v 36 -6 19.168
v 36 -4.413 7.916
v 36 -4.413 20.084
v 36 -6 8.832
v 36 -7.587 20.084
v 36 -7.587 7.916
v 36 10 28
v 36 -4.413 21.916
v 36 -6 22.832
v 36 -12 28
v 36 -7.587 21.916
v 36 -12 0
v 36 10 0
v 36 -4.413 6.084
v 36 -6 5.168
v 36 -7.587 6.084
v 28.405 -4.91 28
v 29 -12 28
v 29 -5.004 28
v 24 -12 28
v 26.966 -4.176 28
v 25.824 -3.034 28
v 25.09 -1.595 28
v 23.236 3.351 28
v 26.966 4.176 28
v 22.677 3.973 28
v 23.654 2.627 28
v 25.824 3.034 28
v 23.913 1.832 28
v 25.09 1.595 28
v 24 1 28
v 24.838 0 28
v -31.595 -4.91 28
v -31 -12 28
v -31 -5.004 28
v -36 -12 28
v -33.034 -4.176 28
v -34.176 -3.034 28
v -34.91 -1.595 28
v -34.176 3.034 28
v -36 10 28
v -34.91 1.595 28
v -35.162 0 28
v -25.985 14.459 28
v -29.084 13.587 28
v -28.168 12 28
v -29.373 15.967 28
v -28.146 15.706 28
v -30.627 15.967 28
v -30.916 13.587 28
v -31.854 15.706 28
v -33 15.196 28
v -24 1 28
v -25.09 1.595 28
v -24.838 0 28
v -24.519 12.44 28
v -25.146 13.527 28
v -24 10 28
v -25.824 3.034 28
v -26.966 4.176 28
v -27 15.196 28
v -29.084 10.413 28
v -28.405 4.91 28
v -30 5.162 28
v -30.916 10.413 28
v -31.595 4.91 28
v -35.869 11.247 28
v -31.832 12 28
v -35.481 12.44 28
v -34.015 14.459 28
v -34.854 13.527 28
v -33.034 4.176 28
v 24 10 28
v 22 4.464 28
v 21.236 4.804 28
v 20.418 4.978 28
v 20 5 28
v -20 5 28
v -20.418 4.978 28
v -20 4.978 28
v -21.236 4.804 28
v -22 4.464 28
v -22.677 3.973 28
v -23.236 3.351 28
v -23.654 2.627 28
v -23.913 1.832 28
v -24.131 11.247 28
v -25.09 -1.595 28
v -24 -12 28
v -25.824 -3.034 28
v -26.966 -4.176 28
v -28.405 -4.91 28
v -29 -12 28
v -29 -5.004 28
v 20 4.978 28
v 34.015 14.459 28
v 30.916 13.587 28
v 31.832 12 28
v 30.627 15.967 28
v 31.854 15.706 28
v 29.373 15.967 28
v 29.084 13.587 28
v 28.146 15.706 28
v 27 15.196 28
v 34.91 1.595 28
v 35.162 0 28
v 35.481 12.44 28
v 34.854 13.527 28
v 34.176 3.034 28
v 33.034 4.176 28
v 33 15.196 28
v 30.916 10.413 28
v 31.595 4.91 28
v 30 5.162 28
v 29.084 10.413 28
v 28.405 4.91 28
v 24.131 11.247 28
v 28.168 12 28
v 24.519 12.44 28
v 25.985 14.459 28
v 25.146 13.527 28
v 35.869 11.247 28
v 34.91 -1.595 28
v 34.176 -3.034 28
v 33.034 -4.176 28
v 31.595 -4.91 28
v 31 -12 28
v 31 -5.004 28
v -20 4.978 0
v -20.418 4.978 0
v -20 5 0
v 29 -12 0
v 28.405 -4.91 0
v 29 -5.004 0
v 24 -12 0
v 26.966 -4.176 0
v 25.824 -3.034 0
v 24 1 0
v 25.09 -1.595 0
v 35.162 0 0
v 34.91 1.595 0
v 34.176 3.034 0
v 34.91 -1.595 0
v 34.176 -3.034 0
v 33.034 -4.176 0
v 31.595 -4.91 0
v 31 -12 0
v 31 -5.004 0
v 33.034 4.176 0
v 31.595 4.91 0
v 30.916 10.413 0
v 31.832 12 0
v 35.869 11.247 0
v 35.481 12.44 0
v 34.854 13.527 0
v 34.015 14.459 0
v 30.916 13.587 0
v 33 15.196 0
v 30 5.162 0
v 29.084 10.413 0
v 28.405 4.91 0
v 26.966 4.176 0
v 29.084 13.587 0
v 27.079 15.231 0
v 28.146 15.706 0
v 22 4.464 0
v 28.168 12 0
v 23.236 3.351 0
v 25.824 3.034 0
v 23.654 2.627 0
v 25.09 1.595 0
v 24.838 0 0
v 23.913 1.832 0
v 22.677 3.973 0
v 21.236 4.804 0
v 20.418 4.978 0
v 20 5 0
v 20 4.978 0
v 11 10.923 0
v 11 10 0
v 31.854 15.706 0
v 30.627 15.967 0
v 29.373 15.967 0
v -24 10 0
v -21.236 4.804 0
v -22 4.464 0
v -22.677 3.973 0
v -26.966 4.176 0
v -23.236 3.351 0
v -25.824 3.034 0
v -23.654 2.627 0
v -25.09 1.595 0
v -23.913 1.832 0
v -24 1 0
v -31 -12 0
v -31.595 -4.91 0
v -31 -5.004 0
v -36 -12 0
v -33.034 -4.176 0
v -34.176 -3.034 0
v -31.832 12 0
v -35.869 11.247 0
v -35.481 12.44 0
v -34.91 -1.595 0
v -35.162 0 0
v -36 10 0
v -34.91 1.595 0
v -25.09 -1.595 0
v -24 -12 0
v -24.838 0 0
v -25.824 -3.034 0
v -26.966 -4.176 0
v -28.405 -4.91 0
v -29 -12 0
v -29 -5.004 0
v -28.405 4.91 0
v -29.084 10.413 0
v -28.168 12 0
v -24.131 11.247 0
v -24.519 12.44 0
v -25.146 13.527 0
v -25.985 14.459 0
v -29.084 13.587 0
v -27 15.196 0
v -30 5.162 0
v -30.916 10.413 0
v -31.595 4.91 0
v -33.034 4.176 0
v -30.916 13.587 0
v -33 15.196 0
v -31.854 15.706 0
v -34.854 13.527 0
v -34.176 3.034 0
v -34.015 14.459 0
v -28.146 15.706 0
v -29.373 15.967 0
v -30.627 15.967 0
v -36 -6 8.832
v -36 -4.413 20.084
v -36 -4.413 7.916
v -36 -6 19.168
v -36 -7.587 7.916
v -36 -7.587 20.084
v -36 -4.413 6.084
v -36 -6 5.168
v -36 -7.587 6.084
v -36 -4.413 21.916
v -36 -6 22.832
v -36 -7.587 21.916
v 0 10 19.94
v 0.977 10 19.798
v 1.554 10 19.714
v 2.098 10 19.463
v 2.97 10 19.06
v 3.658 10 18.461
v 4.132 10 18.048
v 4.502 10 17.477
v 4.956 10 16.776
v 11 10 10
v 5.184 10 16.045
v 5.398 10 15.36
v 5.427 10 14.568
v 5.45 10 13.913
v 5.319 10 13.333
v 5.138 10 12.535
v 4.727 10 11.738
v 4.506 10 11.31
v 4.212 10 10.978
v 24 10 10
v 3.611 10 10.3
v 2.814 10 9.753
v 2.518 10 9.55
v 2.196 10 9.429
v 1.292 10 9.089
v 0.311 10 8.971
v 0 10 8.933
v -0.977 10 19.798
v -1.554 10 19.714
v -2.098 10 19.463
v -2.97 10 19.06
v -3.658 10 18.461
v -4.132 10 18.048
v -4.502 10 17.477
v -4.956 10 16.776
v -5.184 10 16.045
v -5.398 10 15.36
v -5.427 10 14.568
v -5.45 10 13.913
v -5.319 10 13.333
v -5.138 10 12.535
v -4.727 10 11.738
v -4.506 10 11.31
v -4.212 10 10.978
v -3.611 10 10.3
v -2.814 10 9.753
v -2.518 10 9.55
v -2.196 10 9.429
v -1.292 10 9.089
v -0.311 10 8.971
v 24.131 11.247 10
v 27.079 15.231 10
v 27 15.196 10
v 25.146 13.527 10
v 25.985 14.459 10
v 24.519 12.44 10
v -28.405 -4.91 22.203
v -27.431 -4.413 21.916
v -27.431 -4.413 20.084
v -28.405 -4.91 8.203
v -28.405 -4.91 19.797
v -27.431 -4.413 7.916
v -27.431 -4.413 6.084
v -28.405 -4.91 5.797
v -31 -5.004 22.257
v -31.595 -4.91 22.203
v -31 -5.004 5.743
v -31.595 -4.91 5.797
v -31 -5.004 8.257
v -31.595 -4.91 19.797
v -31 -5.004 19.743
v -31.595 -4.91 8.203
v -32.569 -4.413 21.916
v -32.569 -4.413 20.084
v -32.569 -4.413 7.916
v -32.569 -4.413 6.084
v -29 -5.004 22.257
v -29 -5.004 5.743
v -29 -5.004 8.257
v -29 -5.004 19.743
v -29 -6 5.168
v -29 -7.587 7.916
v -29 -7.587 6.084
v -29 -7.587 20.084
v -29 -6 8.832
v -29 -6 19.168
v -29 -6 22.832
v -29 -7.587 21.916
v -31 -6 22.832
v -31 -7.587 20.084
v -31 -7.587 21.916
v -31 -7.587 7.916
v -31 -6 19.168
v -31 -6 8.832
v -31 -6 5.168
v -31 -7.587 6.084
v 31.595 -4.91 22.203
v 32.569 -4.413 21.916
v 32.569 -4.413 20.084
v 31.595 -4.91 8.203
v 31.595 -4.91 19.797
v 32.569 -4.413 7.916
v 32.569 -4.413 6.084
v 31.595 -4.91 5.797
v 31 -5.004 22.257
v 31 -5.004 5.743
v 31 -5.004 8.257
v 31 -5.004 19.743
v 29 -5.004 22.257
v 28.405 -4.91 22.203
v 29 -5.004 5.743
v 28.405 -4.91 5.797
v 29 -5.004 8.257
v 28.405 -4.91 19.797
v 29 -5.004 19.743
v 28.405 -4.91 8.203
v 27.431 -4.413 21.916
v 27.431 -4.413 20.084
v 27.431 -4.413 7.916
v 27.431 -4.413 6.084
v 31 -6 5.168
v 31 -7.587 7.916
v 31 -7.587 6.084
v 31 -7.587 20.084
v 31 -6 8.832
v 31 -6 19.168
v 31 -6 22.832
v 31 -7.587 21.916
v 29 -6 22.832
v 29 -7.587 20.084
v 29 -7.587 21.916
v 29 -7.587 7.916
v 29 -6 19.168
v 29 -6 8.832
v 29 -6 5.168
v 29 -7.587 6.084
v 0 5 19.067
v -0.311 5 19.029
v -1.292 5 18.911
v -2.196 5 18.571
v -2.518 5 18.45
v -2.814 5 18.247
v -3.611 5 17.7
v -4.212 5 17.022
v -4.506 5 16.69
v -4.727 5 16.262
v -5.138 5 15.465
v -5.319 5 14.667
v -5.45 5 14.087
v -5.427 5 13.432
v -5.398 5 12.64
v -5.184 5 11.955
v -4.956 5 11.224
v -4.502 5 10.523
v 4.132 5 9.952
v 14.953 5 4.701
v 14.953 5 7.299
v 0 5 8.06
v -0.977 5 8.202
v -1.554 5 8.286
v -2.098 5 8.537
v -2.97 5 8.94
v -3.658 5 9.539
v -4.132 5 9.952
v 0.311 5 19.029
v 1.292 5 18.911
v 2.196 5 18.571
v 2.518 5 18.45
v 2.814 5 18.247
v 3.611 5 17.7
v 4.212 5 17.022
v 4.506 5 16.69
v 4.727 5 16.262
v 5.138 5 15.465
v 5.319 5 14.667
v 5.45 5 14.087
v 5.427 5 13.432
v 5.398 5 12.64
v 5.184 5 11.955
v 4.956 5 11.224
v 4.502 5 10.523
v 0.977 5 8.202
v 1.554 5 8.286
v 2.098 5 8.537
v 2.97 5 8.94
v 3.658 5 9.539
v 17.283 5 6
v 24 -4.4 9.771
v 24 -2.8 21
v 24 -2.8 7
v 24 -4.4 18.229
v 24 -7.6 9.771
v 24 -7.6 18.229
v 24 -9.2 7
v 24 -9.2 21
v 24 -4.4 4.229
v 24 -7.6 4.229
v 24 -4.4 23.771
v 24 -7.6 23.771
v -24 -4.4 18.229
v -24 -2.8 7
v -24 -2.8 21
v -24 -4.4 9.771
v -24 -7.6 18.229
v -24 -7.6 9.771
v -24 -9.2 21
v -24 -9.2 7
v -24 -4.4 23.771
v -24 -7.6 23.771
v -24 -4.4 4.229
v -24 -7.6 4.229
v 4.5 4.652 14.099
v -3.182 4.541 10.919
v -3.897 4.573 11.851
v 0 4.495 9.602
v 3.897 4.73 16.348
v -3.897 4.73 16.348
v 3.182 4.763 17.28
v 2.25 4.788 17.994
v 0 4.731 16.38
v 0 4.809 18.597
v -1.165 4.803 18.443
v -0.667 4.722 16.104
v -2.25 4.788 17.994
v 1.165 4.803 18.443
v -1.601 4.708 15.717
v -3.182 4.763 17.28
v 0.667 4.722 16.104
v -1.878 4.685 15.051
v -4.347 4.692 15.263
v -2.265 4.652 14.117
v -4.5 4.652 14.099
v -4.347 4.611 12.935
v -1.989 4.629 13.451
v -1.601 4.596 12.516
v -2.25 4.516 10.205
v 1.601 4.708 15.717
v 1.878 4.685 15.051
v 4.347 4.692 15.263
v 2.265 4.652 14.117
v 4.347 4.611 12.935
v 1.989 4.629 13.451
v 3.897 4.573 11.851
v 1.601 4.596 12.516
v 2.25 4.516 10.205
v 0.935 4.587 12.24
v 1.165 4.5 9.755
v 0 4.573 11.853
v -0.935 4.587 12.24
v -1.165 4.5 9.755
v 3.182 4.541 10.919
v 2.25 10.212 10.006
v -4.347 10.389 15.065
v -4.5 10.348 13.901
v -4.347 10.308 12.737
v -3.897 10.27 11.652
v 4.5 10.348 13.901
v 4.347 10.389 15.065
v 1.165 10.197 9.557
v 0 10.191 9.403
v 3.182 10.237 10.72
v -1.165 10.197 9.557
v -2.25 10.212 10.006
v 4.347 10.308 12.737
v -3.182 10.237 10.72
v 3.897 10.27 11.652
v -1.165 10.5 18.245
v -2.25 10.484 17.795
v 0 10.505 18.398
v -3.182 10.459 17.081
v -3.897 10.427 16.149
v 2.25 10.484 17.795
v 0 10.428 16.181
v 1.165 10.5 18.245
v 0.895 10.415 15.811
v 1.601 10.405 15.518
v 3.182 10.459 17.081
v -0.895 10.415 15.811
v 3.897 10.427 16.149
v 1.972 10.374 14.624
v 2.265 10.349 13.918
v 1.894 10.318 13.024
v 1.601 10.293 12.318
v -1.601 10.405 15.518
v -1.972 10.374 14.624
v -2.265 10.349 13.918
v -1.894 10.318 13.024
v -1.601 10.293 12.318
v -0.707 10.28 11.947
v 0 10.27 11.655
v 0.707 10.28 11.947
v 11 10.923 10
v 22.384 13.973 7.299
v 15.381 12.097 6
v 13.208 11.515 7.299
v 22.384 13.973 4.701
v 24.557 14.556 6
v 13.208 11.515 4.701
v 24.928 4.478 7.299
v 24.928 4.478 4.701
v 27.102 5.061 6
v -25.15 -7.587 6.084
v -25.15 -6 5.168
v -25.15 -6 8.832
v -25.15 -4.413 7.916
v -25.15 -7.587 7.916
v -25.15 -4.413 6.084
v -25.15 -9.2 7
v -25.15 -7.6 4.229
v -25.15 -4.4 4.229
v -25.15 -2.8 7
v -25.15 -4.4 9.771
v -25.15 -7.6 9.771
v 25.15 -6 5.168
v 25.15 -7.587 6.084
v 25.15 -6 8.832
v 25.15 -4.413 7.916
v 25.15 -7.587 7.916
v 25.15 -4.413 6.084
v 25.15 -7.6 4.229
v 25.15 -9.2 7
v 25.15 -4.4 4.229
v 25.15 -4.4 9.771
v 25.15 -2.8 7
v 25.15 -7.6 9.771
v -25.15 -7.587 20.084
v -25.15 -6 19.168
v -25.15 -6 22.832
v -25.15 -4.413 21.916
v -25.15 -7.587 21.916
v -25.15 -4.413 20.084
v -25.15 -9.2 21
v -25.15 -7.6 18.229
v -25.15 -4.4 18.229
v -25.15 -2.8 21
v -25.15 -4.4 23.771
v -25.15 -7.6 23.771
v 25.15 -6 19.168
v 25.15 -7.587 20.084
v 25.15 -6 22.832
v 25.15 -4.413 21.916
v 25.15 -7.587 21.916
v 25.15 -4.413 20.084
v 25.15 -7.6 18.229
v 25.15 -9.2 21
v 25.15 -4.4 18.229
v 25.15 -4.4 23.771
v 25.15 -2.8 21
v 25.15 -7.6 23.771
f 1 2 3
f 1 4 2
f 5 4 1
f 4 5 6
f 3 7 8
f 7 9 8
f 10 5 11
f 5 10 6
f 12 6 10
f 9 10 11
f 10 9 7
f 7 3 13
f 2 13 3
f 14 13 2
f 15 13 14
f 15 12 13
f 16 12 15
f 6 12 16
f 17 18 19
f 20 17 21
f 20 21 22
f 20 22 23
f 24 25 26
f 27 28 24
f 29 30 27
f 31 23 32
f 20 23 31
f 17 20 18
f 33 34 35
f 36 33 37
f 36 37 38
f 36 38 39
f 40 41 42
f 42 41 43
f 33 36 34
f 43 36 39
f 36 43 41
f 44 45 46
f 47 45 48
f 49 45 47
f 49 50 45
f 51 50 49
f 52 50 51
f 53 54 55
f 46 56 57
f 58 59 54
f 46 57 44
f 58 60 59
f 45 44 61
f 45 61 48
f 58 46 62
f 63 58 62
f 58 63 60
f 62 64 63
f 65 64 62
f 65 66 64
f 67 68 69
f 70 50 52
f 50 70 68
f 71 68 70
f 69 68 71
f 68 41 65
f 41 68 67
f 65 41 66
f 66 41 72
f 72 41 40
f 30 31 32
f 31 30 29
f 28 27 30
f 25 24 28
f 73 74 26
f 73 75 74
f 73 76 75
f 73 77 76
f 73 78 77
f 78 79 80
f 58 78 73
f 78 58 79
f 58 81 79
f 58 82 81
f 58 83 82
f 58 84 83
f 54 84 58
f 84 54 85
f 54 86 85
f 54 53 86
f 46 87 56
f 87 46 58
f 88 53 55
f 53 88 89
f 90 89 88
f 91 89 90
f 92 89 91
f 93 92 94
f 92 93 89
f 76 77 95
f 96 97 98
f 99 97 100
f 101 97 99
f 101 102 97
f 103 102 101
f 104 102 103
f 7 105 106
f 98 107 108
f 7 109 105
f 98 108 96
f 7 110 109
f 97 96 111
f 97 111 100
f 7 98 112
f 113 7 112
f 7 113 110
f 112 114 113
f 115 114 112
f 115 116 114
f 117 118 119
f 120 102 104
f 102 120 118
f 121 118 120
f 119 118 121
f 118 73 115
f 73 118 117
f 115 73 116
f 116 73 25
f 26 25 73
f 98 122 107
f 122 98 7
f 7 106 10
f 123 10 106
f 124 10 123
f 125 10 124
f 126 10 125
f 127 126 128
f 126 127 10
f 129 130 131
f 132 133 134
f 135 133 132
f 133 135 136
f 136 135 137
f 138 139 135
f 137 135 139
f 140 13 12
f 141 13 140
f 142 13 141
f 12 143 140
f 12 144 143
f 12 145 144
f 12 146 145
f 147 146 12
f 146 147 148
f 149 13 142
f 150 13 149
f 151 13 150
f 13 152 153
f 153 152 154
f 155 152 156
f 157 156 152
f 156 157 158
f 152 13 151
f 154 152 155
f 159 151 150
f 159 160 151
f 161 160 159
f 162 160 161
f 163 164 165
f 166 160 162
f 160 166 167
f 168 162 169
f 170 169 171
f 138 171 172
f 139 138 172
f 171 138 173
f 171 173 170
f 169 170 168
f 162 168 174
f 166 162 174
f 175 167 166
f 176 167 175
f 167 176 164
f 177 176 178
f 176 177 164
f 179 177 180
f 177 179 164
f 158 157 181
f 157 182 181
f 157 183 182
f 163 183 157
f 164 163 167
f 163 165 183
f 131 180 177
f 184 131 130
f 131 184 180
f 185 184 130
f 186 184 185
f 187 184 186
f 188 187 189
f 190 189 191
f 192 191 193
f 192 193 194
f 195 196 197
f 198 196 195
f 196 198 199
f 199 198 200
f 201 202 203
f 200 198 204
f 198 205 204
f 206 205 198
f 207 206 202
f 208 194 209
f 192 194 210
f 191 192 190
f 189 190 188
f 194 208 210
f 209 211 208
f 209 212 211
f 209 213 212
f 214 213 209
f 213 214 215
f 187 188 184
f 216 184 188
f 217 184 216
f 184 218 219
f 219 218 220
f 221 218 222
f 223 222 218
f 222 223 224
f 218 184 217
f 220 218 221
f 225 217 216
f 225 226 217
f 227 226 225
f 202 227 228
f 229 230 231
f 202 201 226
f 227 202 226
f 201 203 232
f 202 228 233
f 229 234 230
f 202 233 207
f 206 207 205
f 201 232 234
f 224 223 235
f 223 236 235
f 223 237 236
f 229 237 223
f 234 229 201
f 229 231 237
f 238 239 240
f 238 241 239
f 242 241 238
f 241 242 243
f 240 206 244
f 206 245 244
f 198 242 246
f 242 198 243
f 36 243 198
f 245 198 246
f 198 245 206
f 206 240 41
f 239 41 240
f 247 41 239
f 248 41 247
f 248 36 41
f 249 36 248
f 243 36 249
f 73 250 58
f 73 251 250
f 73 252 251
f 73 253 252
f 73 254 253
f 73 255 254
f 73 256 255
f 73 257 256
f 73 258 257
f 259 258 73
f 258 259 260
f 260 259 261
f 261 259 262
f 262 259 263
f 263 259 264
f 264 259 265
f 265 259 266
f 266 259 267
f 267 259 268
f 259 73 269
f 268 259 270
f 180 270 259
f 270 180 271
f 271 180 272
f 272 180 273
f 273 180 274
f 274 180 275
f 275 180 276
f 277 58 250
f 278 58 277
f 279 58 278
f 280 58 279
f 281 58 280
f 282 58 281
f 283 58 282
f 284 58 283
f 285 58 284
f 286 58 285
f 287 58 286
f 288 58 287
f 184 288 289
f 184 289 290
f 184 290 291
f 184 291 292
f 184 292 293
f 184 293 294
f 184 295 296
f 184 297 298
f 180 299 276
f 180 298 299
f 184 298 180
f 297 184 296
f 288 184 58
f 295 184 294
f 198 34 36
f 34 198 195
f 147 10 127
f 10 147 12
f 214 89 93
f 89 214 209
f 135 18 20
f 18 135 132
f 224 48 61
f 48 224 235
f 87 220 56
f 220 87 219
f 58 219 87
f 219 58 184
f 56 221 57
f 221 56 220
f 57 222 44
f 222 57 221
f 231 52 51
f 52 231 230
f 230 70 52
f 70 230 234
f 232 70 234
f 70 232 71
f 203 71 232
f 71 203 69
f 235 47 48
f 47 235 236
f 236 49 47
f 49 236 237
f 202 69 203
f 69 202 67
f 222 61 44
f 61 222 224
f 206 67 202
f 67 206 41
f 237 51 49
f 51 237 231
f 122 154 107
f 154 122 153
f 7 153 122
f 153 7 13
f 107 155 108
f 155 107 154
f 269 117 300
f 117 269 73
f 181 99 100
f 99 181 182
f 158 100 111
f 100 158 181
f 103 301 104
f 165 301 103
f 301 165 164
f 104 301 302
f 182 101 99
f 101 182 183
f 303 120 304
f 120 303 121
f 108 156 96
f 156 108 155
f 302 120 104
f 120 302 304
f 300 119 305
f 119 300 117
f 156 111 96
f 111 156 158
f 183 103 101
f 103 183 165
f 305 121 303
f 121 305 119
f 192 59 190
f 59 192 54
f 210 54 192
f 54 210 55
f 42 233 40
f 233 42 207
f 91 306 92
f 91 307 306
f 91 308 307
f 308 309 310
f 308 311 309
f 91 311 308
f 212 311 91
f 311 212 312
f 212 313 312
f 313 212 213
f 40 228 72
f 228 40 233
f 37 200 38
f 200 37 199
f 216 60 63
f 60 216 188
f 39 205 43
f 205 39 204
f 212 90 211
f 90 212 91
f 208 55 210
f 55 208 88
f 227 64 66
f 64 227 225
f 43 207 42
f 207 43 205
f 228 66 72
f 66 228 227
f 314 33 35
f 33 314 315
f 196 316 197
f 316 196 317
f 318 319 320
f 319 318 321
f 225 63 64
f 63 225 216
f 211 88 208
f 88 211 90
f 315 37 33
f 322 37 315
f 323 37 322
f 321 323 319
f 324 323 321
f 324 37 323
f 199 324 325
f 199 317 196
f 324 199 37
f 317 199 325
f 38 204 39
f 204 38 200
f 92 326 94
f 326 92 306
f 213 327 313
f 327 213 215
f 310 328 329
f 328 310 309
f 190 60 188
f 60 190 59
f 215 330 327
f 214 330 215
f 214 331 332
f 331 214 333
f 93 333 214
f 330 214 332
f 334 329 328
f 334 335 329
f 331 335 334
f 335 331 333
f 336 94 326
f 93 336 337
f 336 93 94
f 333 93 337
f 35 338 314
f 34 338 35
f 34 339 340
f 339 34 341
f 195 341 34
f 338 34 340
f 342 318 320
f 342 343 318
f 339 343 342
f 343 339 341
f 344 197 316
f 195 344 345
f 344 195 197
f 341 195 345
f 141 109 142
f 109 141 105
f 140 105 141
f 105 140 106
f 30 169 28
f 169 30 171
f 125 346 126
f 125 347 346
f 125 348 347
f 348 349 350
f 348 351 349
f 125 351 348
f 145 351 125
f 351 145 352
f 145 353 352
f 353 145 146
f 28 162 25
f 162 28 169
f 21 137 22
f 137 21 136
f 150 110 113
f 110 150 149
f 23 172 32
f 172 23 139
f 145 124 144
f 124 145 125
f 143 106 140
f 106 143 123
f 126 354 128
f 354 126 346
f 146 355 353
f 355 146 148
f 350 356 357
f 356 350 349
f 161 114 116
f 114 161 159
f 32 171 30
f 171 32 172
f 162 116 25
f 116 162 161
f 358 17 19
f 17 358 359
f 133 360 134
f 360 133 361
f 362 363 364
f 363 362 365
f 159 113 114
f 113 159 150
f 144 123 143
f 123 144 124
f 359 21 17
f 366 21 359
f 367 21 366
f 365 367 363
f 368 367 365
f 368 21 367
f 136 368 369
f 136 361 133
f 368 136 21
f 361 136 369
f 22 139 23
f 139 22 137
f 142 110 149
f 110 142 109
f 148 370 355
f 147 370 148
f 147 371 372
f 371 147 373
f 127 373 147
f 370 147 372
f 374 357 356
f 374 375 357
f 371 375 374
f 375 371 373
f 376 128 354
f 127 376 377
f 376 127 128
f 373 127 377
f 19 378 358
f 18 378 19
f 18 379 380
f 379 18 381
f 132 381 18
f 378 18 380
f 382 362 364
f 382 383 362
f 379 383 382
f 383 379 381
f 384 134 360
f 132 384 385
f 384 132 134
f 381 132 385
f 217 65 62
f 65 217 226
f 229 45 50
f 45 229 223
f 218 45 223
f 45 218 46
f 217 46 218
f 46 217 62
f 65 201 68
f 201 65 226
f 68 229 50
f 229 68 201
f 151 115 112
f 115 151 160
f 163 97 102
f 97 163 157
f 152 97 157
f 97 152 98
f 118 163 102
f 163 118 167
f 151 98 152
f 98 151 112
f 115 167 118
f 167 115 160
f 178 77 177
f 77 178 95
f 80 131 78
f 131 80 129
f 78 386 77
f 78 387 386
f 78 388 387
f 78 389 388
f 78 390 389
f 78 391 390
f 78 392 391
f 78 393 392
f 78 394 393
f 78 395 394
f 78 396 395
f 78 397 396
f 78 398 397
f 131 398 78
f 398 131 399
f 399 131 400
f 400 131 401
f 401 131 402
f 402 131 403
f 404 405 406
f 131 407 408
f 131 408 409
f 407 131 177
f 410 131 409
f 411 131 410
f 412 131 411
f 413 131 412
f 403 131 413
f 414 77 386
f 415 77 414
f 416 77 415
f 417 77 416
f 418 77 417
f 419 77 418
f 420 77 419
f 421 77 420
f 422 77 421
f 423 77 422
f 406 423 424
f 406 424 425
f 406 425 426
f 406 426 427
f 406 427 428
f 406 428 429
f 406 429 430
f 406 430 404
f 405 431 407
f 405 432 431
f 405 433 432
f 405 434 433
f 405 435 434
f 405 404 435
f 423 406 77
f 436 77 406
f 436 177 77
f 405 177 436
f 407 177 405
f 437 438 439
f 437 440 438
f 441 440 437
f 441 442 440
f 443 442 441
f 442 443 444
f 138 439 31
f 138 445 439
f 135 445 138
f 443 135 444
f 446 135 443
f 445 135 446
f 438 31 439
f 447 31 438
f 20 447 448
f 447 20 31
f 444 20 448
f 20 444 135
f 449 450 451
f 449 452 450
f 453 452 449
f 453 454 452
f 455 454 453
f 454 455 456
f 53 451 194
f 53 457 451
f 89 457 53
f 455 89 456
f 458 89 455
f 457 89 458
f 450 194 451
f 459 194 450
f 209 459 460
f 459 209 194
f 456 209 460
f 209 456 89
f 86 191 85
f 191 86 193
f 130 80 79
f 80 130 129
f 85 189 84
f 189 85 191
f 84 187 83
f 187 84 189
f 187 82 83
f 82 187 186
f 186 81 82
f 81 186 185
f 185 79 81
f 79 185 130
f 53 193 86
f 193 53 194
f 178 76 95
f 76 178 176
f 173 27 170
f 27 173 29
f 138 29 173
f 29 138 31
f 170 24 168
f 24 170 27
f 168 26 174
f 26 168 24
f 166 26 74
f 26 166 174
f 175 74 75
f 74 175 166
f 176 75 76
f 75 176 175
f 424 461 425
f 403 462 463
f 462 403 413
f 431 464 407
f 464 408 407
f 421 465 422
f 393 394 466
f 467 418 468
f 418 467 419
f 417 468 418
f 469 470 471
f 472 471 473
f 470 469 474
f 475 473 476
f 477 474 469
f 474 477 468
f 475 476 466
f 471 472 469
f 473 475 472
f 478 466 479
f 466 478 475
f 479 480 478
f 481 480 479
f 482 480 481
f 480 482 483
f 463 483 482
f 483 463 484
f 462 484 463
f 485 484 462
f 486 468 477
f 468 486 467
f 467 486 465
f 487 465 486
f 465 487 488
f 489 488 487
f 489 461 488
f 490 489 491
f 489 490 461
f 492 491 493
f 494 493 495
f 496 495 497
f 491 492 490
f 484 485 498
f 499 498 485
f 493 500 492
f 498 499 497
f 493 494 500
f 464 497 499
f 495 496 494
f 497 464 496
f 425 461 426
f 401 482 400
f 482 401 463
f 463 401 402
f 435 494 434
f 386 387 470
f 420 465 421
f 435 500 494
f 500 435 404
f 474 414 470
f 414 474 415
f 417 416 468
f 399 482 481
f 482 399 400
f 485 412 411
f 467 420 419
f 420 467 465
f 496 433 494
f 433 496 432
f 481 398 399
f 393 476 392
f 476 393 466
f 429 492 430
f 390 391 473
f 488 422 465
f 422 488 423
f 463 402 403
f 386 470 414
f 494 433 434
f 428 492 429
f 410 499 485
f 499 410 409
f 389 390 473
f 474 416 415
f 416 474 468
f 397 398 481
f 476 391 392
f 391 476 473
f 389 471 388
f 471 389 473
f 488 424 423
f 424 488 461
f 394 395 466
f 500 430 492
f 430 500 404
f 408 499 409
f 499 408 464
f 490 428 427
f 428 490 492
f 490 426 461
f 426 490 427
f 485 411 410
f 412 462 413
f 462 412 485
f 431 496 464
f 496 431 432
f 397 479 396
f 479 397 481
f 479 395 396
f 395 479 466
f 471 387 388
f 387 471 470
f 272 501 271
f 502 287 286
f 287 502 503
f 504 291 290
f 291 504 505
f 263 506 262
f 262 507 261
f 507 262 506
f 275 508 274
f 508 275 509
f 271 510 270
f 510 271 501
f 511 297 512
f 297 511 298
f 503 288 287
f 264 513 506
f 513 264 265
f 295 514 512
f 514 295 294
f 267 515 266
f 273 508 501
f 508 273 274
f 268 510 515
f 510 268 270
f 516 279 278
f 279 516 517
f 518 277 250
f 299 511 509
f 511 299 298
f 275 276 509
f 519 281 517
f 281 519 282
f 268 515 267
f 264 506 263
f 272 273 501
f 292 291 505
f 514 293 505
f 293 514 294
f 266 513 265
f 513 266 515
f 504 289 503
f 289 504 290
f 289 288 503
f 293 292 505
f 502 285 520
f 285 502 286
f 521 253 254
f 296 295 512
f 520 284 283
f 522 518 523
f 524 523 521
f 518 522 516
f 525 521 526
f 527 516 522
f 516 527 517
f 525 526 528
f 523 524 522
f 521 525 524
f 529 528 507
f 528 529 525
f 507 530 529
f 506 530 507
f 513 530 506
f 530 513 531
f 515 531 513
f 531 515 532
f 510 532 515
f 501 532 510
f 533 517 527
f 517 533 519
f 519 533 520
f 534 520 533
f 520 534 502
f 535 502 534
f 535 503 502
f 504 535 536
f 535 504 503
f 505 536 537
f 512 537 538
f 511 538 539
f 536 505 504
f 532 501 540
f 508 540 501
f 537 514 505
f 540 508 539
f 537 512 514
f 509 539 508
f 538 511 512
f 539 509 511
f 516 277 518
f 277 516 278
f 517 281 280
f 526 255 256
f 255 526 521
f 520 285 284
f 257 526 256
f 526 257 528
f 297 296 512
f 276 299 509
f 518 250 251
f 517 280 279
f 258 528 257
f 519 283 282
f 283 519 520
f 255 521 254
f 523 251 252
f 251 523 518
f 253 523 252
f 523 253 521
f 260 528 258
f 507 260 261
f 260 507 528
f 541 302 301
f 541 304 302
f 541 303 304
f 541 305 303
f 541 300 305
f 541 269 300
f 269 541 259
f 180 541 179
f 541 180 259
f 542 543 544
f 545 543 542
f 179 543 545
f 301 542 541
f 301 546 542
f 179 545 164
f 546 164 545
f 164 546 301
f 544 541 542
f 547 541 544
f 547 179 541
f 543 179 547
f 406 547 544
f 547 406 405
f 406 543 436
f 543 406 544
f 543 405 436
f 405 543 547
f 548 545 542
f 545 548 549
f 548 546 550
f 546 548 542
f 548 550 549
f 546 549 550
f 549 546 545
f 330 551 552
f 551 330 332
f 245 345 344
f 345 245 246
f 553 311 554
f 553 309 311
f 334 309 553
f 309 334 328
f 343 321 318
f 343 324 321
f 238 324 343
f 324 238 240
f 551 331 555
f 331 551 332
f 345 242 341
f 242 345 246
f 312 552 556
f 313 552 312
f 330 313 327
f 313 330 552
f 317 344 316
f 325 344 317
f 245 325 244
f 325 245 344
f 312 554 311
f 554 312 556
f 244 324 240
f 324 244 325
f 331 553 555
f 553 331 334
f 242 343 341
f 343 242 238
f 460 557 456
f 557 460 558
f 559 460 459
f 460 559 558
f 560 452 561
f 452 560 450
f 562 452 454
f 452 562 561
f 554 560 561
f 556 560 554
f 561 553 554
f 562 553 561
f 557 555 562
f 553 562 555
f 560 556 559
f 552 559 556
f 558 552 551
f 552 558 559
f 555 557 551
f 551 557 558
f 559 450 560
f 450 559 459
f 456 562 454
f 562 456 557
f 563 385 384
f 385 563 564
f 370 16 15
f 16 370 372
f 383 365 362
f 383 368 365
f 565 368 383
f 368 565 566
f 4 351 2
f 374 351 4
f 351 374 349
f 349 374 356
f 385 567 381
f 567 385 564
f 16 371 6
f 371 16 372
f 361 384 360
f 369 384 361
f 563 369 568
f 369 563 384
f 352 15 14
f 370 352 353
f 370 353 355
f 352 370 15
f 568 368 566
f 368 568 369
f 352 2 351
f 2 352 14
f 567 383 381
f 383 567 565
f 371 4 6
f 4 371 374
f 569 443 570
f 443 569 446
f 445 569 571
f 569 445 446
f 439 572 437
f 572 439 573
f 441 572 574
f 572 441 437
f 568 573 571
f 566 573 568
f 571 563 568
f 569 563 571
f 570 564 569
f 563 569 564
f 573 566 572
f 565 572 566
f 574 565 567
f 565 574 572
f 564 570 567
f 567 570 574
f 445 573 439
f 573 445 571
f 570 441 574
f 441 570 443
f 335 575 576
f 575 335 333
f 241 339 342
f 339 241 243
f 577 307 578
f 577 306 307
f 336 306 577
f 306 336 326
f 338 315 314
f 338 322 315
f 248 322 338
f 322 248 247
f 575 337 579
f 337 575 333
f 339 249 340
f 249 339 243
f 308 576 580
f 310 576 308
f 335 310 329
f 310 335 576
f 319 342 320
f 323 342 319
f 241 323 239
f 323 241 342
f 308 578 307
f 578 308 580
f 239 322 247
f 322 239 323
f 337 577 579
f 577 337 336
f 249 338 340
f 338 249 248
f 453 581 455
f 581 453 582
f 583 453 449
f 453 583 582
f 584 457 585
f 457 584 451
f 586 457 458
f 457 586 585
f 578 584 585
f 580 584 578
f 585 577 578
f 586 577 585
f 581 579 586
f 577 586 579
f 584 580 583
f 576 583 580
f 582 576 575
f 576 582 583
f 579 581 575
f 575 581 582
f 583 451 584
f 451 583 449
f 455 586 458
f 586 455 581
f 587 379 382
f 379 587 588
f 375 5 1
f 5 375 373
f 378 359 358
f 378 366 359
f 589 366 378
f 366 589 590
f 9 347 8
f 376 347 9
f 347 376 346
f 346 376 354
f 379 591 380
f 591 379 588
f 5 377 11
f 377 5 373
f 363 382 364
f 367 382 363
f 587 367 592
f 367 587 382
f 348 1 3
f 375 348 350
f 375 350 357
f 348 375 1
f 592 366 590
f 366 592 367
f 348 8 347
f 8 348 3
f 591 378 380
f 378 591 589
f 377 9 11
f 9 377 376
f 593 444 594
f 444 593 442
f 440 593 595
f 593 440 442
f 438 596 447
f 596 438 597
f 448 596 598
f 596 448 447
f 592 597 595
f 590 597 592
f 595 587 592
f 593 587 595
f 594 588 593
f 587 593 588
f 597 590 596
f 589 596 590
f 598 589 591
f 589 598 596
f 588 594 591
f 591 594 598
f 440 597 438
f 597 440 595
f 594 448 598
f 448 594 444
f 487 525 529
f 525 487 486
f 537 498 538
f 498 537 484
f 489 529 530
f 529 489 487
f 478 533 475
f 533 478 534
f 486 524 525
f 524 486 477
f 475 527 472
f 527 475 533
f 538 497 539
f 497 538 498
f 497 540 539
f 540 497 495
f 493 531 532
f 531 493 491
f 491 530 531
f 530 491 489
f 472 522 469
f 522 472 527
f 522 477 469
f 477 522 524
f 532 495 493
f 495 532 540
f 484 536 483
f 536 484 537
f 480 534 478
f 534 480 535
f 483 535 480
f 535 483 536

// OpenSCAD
// file: polyholes.scad
//
// Mendel90
//
// GNU GPL v2
// nop.head@gmail.com
// hydraraptor.blogspot.com
//
// See http://hydraraptor.blogspot.com/2011/02/polyholes.html
//
function sides(r) = max(round(4 *r),3);
function corrected_radius(r,n) = 0.1 + r / cos(180 / n);
function corrected_diameter(d) = 0.2 + d / cos(180 / sides(d / 2));

module poly_circle(r, center = false) {
    n = sides(r);
    circle(r = corrected_radius(r,n), $fn = n, center = center);
}

module poly_cylinder(r, h, center = false) {
    n = sides(r);
    cylinder(h = h, r = corrected_radius(r,n), $fn = n, center = center);
}

module poly_d_cylinder(r, center = false) {
    n = sides(r);
    r = corrected_radius(r,n);
    cylinder(h = h, r = r, $fn = n, center = center);
    translate([0, -r, 0])
        cube([r, 2 * r, h]);
}
// file: bracket.scad
include <configuration.scad>

$fa = 12;
$fs = 0.5;
use <polyholes.scad>

w = 60; // Smooth rod distance (center to center)

module screws() {
  for (x = [-smooth_rod_separation/2, smooth_rod_separation/2]) {
    translate([x, 0, 0]) {
      // Push-through M3 screw hole.
      translate([0, -6, 0]) rotate([0, 90, 0])
	poly_cylinder(r=1.5, h=20, center=true);
      // M3 nut holder.
      translate([-x/5, -6, 0])
	rotate([30, 0, 0]) rotate([0, 90, 0])
	cylinder(r=3.2, h=2.3, center=true, $fn=6);
    }
  }
}

module bracket(h) {
  difference() {
    union() {
      translate([0, -1, 0]) cube([smooth_rod_separation+12, 22, h], center=true);
      // Sandwich mount.
      translate([-smooth_rod_separation/2, 10, 0]) cylinder(r=6, h=h, center=true);
      translate([smooth_rod_separation/2, 10, 0]) cylinder(r=6, h=h, center=true);
    }
    // Sandwich mount.
    translate([-smooth_rod_separation/2, 12, 0]) poly_cylinder(r=1.5, h=h+1, center=true);
    translate([smooth_rod_separation/2, 12, 0]) poly_cylinder(r=1.5, h=h+1, center=true);
    // Smooth rod mounting slots.
    for (x = [-smooth_rod_separation/2, smooth_rod_separation/2]) {
      translate([x, 0, 0]) {
	poly_cylinder(r=smooth_rod_radius, h=h+1, center=true);
	translate([0, -10, 0]) cube([2, 20, h+1], center=true);
      }
    }
    // Belt path.
    translate([0, -5, 0]) cube([smooth_rod_separation-20, 20, h+1], center=true);
    translate([0, -9, 0]) cube([smooth_rod_separation-12, 20, h+1], center=true);
    translate([-smooth_rod_separation/2+10, 1, 0]) cylinder(r=4, h=h+1, center=true);
    translate([smooth_rod_separation/2-10, 1, 0]) cylinder(r=4, h=h+1, center=true);
  }
}

translate([0, 0, 10]) bracket(20);
// file: configuration.scad
// Bearing dimensions: ID, OD, W
bearing623 = [3, 10, 4];
bearing624 = [4, 13, 5];
bearing608 = [8, 22, 7];
bearinglm8uu = [8, 15, 25];
bearinglm10uu = [10, 19, 29];

smooth_rod_separation = 60;
//smooth_rod_length = 300; // Rostock mini
//smooth_rod_radius = 4;
//smooth_rod_bearing = bearinglm8uu;
smooth_rod_length = 770;
smooth_rod_radius = 5;
smooth_rod_bearing = bearinglm10uu;

motor_end_height = 44;

idler_end_height = 28;
//idler_bearing = bearing608;
idler_bearing = bearing624;

platform_thickness = 8;
platform_hinge_offset = 33;

bed_thickness = 12;
pcb_thickness = 2;

rod_separation = 50;
//rod_length = 150; // Rostock mini
//rod_radius = 65; // Rostock mini
rod_length = 250;
rod_radius = 124;


carriage_height = smooth_rod_bearing[2];
carriage_hinge_offset = smooth_rod_bearing[1]/2+14.5;
// main file
include <configuration.scad>
use <bracket.scad>
use <polyholes.scad>

h = idler_end_height; // Total height.
tilt = 2; // Tilt bearings upward (the timing belt is pulling pretty hard).

module bearing_mount() {
  translate([0, 0, 2.3]) cylinder(r1=idler_bearing[1]/2+1, r2=idler_bearing[1]/2-2, h=1.1, center=true);
  translate([0, 0, -2.3]) cylinder(r1=idler_bearing[1]/2-2, r2=idler_bearing[1]/2+1, h=1.1, center=true);
}

x = 17.7; // Micro switch center.
y = 16; // Micro switch center.

module idler_end() {
  translate([0, 0, h/2]) 
  difference() {
    union() {
      bracket(h);
      translate([0, 7.5, 0]) rotate([90 - tilt, 0, 0]) bearing_mount();
      // Micro switch placeholder.
      % translate([x, y, -h/2+4]) rotate([0, 0, 15])
          cube([19.6, 6.34, 10.2], center=true);
      difference() {
        translate([20, 11.88, -h/2+5])
          cube([18, 8, 10], center=true);
        translate([x, y, -h/2+4]) rotate([0, 0, 15])
          cube([30, 6.34, 20], center=true);
        translate([30, 12, -h/2+5])
          cylinder(r=3, h=20, center=true);
      }
    }
    translate([x, y, -h/2+6]) rotate([0, 0, 15]) {
      translate([-9.5/2, 0, 0]) rotate([90, 0, 0])
	poly_cylinder(r=0.7, h=26, center=true);
      translate([9.5/2, 0, 0]) rotate([90, 0, 0])
	poly_cylinder(r=0.7, h=26, center=true);
    }
    translate([0, 8, 0]) rotate([90 - tilt, 0, 0])
      poly_cylinder(r=idler_bearing[0]/2, h=40, center=true);
    for (z = [-7, 7]) {
      translate([0, 0, z]) screws();
    }
  }
}

idler_end();
